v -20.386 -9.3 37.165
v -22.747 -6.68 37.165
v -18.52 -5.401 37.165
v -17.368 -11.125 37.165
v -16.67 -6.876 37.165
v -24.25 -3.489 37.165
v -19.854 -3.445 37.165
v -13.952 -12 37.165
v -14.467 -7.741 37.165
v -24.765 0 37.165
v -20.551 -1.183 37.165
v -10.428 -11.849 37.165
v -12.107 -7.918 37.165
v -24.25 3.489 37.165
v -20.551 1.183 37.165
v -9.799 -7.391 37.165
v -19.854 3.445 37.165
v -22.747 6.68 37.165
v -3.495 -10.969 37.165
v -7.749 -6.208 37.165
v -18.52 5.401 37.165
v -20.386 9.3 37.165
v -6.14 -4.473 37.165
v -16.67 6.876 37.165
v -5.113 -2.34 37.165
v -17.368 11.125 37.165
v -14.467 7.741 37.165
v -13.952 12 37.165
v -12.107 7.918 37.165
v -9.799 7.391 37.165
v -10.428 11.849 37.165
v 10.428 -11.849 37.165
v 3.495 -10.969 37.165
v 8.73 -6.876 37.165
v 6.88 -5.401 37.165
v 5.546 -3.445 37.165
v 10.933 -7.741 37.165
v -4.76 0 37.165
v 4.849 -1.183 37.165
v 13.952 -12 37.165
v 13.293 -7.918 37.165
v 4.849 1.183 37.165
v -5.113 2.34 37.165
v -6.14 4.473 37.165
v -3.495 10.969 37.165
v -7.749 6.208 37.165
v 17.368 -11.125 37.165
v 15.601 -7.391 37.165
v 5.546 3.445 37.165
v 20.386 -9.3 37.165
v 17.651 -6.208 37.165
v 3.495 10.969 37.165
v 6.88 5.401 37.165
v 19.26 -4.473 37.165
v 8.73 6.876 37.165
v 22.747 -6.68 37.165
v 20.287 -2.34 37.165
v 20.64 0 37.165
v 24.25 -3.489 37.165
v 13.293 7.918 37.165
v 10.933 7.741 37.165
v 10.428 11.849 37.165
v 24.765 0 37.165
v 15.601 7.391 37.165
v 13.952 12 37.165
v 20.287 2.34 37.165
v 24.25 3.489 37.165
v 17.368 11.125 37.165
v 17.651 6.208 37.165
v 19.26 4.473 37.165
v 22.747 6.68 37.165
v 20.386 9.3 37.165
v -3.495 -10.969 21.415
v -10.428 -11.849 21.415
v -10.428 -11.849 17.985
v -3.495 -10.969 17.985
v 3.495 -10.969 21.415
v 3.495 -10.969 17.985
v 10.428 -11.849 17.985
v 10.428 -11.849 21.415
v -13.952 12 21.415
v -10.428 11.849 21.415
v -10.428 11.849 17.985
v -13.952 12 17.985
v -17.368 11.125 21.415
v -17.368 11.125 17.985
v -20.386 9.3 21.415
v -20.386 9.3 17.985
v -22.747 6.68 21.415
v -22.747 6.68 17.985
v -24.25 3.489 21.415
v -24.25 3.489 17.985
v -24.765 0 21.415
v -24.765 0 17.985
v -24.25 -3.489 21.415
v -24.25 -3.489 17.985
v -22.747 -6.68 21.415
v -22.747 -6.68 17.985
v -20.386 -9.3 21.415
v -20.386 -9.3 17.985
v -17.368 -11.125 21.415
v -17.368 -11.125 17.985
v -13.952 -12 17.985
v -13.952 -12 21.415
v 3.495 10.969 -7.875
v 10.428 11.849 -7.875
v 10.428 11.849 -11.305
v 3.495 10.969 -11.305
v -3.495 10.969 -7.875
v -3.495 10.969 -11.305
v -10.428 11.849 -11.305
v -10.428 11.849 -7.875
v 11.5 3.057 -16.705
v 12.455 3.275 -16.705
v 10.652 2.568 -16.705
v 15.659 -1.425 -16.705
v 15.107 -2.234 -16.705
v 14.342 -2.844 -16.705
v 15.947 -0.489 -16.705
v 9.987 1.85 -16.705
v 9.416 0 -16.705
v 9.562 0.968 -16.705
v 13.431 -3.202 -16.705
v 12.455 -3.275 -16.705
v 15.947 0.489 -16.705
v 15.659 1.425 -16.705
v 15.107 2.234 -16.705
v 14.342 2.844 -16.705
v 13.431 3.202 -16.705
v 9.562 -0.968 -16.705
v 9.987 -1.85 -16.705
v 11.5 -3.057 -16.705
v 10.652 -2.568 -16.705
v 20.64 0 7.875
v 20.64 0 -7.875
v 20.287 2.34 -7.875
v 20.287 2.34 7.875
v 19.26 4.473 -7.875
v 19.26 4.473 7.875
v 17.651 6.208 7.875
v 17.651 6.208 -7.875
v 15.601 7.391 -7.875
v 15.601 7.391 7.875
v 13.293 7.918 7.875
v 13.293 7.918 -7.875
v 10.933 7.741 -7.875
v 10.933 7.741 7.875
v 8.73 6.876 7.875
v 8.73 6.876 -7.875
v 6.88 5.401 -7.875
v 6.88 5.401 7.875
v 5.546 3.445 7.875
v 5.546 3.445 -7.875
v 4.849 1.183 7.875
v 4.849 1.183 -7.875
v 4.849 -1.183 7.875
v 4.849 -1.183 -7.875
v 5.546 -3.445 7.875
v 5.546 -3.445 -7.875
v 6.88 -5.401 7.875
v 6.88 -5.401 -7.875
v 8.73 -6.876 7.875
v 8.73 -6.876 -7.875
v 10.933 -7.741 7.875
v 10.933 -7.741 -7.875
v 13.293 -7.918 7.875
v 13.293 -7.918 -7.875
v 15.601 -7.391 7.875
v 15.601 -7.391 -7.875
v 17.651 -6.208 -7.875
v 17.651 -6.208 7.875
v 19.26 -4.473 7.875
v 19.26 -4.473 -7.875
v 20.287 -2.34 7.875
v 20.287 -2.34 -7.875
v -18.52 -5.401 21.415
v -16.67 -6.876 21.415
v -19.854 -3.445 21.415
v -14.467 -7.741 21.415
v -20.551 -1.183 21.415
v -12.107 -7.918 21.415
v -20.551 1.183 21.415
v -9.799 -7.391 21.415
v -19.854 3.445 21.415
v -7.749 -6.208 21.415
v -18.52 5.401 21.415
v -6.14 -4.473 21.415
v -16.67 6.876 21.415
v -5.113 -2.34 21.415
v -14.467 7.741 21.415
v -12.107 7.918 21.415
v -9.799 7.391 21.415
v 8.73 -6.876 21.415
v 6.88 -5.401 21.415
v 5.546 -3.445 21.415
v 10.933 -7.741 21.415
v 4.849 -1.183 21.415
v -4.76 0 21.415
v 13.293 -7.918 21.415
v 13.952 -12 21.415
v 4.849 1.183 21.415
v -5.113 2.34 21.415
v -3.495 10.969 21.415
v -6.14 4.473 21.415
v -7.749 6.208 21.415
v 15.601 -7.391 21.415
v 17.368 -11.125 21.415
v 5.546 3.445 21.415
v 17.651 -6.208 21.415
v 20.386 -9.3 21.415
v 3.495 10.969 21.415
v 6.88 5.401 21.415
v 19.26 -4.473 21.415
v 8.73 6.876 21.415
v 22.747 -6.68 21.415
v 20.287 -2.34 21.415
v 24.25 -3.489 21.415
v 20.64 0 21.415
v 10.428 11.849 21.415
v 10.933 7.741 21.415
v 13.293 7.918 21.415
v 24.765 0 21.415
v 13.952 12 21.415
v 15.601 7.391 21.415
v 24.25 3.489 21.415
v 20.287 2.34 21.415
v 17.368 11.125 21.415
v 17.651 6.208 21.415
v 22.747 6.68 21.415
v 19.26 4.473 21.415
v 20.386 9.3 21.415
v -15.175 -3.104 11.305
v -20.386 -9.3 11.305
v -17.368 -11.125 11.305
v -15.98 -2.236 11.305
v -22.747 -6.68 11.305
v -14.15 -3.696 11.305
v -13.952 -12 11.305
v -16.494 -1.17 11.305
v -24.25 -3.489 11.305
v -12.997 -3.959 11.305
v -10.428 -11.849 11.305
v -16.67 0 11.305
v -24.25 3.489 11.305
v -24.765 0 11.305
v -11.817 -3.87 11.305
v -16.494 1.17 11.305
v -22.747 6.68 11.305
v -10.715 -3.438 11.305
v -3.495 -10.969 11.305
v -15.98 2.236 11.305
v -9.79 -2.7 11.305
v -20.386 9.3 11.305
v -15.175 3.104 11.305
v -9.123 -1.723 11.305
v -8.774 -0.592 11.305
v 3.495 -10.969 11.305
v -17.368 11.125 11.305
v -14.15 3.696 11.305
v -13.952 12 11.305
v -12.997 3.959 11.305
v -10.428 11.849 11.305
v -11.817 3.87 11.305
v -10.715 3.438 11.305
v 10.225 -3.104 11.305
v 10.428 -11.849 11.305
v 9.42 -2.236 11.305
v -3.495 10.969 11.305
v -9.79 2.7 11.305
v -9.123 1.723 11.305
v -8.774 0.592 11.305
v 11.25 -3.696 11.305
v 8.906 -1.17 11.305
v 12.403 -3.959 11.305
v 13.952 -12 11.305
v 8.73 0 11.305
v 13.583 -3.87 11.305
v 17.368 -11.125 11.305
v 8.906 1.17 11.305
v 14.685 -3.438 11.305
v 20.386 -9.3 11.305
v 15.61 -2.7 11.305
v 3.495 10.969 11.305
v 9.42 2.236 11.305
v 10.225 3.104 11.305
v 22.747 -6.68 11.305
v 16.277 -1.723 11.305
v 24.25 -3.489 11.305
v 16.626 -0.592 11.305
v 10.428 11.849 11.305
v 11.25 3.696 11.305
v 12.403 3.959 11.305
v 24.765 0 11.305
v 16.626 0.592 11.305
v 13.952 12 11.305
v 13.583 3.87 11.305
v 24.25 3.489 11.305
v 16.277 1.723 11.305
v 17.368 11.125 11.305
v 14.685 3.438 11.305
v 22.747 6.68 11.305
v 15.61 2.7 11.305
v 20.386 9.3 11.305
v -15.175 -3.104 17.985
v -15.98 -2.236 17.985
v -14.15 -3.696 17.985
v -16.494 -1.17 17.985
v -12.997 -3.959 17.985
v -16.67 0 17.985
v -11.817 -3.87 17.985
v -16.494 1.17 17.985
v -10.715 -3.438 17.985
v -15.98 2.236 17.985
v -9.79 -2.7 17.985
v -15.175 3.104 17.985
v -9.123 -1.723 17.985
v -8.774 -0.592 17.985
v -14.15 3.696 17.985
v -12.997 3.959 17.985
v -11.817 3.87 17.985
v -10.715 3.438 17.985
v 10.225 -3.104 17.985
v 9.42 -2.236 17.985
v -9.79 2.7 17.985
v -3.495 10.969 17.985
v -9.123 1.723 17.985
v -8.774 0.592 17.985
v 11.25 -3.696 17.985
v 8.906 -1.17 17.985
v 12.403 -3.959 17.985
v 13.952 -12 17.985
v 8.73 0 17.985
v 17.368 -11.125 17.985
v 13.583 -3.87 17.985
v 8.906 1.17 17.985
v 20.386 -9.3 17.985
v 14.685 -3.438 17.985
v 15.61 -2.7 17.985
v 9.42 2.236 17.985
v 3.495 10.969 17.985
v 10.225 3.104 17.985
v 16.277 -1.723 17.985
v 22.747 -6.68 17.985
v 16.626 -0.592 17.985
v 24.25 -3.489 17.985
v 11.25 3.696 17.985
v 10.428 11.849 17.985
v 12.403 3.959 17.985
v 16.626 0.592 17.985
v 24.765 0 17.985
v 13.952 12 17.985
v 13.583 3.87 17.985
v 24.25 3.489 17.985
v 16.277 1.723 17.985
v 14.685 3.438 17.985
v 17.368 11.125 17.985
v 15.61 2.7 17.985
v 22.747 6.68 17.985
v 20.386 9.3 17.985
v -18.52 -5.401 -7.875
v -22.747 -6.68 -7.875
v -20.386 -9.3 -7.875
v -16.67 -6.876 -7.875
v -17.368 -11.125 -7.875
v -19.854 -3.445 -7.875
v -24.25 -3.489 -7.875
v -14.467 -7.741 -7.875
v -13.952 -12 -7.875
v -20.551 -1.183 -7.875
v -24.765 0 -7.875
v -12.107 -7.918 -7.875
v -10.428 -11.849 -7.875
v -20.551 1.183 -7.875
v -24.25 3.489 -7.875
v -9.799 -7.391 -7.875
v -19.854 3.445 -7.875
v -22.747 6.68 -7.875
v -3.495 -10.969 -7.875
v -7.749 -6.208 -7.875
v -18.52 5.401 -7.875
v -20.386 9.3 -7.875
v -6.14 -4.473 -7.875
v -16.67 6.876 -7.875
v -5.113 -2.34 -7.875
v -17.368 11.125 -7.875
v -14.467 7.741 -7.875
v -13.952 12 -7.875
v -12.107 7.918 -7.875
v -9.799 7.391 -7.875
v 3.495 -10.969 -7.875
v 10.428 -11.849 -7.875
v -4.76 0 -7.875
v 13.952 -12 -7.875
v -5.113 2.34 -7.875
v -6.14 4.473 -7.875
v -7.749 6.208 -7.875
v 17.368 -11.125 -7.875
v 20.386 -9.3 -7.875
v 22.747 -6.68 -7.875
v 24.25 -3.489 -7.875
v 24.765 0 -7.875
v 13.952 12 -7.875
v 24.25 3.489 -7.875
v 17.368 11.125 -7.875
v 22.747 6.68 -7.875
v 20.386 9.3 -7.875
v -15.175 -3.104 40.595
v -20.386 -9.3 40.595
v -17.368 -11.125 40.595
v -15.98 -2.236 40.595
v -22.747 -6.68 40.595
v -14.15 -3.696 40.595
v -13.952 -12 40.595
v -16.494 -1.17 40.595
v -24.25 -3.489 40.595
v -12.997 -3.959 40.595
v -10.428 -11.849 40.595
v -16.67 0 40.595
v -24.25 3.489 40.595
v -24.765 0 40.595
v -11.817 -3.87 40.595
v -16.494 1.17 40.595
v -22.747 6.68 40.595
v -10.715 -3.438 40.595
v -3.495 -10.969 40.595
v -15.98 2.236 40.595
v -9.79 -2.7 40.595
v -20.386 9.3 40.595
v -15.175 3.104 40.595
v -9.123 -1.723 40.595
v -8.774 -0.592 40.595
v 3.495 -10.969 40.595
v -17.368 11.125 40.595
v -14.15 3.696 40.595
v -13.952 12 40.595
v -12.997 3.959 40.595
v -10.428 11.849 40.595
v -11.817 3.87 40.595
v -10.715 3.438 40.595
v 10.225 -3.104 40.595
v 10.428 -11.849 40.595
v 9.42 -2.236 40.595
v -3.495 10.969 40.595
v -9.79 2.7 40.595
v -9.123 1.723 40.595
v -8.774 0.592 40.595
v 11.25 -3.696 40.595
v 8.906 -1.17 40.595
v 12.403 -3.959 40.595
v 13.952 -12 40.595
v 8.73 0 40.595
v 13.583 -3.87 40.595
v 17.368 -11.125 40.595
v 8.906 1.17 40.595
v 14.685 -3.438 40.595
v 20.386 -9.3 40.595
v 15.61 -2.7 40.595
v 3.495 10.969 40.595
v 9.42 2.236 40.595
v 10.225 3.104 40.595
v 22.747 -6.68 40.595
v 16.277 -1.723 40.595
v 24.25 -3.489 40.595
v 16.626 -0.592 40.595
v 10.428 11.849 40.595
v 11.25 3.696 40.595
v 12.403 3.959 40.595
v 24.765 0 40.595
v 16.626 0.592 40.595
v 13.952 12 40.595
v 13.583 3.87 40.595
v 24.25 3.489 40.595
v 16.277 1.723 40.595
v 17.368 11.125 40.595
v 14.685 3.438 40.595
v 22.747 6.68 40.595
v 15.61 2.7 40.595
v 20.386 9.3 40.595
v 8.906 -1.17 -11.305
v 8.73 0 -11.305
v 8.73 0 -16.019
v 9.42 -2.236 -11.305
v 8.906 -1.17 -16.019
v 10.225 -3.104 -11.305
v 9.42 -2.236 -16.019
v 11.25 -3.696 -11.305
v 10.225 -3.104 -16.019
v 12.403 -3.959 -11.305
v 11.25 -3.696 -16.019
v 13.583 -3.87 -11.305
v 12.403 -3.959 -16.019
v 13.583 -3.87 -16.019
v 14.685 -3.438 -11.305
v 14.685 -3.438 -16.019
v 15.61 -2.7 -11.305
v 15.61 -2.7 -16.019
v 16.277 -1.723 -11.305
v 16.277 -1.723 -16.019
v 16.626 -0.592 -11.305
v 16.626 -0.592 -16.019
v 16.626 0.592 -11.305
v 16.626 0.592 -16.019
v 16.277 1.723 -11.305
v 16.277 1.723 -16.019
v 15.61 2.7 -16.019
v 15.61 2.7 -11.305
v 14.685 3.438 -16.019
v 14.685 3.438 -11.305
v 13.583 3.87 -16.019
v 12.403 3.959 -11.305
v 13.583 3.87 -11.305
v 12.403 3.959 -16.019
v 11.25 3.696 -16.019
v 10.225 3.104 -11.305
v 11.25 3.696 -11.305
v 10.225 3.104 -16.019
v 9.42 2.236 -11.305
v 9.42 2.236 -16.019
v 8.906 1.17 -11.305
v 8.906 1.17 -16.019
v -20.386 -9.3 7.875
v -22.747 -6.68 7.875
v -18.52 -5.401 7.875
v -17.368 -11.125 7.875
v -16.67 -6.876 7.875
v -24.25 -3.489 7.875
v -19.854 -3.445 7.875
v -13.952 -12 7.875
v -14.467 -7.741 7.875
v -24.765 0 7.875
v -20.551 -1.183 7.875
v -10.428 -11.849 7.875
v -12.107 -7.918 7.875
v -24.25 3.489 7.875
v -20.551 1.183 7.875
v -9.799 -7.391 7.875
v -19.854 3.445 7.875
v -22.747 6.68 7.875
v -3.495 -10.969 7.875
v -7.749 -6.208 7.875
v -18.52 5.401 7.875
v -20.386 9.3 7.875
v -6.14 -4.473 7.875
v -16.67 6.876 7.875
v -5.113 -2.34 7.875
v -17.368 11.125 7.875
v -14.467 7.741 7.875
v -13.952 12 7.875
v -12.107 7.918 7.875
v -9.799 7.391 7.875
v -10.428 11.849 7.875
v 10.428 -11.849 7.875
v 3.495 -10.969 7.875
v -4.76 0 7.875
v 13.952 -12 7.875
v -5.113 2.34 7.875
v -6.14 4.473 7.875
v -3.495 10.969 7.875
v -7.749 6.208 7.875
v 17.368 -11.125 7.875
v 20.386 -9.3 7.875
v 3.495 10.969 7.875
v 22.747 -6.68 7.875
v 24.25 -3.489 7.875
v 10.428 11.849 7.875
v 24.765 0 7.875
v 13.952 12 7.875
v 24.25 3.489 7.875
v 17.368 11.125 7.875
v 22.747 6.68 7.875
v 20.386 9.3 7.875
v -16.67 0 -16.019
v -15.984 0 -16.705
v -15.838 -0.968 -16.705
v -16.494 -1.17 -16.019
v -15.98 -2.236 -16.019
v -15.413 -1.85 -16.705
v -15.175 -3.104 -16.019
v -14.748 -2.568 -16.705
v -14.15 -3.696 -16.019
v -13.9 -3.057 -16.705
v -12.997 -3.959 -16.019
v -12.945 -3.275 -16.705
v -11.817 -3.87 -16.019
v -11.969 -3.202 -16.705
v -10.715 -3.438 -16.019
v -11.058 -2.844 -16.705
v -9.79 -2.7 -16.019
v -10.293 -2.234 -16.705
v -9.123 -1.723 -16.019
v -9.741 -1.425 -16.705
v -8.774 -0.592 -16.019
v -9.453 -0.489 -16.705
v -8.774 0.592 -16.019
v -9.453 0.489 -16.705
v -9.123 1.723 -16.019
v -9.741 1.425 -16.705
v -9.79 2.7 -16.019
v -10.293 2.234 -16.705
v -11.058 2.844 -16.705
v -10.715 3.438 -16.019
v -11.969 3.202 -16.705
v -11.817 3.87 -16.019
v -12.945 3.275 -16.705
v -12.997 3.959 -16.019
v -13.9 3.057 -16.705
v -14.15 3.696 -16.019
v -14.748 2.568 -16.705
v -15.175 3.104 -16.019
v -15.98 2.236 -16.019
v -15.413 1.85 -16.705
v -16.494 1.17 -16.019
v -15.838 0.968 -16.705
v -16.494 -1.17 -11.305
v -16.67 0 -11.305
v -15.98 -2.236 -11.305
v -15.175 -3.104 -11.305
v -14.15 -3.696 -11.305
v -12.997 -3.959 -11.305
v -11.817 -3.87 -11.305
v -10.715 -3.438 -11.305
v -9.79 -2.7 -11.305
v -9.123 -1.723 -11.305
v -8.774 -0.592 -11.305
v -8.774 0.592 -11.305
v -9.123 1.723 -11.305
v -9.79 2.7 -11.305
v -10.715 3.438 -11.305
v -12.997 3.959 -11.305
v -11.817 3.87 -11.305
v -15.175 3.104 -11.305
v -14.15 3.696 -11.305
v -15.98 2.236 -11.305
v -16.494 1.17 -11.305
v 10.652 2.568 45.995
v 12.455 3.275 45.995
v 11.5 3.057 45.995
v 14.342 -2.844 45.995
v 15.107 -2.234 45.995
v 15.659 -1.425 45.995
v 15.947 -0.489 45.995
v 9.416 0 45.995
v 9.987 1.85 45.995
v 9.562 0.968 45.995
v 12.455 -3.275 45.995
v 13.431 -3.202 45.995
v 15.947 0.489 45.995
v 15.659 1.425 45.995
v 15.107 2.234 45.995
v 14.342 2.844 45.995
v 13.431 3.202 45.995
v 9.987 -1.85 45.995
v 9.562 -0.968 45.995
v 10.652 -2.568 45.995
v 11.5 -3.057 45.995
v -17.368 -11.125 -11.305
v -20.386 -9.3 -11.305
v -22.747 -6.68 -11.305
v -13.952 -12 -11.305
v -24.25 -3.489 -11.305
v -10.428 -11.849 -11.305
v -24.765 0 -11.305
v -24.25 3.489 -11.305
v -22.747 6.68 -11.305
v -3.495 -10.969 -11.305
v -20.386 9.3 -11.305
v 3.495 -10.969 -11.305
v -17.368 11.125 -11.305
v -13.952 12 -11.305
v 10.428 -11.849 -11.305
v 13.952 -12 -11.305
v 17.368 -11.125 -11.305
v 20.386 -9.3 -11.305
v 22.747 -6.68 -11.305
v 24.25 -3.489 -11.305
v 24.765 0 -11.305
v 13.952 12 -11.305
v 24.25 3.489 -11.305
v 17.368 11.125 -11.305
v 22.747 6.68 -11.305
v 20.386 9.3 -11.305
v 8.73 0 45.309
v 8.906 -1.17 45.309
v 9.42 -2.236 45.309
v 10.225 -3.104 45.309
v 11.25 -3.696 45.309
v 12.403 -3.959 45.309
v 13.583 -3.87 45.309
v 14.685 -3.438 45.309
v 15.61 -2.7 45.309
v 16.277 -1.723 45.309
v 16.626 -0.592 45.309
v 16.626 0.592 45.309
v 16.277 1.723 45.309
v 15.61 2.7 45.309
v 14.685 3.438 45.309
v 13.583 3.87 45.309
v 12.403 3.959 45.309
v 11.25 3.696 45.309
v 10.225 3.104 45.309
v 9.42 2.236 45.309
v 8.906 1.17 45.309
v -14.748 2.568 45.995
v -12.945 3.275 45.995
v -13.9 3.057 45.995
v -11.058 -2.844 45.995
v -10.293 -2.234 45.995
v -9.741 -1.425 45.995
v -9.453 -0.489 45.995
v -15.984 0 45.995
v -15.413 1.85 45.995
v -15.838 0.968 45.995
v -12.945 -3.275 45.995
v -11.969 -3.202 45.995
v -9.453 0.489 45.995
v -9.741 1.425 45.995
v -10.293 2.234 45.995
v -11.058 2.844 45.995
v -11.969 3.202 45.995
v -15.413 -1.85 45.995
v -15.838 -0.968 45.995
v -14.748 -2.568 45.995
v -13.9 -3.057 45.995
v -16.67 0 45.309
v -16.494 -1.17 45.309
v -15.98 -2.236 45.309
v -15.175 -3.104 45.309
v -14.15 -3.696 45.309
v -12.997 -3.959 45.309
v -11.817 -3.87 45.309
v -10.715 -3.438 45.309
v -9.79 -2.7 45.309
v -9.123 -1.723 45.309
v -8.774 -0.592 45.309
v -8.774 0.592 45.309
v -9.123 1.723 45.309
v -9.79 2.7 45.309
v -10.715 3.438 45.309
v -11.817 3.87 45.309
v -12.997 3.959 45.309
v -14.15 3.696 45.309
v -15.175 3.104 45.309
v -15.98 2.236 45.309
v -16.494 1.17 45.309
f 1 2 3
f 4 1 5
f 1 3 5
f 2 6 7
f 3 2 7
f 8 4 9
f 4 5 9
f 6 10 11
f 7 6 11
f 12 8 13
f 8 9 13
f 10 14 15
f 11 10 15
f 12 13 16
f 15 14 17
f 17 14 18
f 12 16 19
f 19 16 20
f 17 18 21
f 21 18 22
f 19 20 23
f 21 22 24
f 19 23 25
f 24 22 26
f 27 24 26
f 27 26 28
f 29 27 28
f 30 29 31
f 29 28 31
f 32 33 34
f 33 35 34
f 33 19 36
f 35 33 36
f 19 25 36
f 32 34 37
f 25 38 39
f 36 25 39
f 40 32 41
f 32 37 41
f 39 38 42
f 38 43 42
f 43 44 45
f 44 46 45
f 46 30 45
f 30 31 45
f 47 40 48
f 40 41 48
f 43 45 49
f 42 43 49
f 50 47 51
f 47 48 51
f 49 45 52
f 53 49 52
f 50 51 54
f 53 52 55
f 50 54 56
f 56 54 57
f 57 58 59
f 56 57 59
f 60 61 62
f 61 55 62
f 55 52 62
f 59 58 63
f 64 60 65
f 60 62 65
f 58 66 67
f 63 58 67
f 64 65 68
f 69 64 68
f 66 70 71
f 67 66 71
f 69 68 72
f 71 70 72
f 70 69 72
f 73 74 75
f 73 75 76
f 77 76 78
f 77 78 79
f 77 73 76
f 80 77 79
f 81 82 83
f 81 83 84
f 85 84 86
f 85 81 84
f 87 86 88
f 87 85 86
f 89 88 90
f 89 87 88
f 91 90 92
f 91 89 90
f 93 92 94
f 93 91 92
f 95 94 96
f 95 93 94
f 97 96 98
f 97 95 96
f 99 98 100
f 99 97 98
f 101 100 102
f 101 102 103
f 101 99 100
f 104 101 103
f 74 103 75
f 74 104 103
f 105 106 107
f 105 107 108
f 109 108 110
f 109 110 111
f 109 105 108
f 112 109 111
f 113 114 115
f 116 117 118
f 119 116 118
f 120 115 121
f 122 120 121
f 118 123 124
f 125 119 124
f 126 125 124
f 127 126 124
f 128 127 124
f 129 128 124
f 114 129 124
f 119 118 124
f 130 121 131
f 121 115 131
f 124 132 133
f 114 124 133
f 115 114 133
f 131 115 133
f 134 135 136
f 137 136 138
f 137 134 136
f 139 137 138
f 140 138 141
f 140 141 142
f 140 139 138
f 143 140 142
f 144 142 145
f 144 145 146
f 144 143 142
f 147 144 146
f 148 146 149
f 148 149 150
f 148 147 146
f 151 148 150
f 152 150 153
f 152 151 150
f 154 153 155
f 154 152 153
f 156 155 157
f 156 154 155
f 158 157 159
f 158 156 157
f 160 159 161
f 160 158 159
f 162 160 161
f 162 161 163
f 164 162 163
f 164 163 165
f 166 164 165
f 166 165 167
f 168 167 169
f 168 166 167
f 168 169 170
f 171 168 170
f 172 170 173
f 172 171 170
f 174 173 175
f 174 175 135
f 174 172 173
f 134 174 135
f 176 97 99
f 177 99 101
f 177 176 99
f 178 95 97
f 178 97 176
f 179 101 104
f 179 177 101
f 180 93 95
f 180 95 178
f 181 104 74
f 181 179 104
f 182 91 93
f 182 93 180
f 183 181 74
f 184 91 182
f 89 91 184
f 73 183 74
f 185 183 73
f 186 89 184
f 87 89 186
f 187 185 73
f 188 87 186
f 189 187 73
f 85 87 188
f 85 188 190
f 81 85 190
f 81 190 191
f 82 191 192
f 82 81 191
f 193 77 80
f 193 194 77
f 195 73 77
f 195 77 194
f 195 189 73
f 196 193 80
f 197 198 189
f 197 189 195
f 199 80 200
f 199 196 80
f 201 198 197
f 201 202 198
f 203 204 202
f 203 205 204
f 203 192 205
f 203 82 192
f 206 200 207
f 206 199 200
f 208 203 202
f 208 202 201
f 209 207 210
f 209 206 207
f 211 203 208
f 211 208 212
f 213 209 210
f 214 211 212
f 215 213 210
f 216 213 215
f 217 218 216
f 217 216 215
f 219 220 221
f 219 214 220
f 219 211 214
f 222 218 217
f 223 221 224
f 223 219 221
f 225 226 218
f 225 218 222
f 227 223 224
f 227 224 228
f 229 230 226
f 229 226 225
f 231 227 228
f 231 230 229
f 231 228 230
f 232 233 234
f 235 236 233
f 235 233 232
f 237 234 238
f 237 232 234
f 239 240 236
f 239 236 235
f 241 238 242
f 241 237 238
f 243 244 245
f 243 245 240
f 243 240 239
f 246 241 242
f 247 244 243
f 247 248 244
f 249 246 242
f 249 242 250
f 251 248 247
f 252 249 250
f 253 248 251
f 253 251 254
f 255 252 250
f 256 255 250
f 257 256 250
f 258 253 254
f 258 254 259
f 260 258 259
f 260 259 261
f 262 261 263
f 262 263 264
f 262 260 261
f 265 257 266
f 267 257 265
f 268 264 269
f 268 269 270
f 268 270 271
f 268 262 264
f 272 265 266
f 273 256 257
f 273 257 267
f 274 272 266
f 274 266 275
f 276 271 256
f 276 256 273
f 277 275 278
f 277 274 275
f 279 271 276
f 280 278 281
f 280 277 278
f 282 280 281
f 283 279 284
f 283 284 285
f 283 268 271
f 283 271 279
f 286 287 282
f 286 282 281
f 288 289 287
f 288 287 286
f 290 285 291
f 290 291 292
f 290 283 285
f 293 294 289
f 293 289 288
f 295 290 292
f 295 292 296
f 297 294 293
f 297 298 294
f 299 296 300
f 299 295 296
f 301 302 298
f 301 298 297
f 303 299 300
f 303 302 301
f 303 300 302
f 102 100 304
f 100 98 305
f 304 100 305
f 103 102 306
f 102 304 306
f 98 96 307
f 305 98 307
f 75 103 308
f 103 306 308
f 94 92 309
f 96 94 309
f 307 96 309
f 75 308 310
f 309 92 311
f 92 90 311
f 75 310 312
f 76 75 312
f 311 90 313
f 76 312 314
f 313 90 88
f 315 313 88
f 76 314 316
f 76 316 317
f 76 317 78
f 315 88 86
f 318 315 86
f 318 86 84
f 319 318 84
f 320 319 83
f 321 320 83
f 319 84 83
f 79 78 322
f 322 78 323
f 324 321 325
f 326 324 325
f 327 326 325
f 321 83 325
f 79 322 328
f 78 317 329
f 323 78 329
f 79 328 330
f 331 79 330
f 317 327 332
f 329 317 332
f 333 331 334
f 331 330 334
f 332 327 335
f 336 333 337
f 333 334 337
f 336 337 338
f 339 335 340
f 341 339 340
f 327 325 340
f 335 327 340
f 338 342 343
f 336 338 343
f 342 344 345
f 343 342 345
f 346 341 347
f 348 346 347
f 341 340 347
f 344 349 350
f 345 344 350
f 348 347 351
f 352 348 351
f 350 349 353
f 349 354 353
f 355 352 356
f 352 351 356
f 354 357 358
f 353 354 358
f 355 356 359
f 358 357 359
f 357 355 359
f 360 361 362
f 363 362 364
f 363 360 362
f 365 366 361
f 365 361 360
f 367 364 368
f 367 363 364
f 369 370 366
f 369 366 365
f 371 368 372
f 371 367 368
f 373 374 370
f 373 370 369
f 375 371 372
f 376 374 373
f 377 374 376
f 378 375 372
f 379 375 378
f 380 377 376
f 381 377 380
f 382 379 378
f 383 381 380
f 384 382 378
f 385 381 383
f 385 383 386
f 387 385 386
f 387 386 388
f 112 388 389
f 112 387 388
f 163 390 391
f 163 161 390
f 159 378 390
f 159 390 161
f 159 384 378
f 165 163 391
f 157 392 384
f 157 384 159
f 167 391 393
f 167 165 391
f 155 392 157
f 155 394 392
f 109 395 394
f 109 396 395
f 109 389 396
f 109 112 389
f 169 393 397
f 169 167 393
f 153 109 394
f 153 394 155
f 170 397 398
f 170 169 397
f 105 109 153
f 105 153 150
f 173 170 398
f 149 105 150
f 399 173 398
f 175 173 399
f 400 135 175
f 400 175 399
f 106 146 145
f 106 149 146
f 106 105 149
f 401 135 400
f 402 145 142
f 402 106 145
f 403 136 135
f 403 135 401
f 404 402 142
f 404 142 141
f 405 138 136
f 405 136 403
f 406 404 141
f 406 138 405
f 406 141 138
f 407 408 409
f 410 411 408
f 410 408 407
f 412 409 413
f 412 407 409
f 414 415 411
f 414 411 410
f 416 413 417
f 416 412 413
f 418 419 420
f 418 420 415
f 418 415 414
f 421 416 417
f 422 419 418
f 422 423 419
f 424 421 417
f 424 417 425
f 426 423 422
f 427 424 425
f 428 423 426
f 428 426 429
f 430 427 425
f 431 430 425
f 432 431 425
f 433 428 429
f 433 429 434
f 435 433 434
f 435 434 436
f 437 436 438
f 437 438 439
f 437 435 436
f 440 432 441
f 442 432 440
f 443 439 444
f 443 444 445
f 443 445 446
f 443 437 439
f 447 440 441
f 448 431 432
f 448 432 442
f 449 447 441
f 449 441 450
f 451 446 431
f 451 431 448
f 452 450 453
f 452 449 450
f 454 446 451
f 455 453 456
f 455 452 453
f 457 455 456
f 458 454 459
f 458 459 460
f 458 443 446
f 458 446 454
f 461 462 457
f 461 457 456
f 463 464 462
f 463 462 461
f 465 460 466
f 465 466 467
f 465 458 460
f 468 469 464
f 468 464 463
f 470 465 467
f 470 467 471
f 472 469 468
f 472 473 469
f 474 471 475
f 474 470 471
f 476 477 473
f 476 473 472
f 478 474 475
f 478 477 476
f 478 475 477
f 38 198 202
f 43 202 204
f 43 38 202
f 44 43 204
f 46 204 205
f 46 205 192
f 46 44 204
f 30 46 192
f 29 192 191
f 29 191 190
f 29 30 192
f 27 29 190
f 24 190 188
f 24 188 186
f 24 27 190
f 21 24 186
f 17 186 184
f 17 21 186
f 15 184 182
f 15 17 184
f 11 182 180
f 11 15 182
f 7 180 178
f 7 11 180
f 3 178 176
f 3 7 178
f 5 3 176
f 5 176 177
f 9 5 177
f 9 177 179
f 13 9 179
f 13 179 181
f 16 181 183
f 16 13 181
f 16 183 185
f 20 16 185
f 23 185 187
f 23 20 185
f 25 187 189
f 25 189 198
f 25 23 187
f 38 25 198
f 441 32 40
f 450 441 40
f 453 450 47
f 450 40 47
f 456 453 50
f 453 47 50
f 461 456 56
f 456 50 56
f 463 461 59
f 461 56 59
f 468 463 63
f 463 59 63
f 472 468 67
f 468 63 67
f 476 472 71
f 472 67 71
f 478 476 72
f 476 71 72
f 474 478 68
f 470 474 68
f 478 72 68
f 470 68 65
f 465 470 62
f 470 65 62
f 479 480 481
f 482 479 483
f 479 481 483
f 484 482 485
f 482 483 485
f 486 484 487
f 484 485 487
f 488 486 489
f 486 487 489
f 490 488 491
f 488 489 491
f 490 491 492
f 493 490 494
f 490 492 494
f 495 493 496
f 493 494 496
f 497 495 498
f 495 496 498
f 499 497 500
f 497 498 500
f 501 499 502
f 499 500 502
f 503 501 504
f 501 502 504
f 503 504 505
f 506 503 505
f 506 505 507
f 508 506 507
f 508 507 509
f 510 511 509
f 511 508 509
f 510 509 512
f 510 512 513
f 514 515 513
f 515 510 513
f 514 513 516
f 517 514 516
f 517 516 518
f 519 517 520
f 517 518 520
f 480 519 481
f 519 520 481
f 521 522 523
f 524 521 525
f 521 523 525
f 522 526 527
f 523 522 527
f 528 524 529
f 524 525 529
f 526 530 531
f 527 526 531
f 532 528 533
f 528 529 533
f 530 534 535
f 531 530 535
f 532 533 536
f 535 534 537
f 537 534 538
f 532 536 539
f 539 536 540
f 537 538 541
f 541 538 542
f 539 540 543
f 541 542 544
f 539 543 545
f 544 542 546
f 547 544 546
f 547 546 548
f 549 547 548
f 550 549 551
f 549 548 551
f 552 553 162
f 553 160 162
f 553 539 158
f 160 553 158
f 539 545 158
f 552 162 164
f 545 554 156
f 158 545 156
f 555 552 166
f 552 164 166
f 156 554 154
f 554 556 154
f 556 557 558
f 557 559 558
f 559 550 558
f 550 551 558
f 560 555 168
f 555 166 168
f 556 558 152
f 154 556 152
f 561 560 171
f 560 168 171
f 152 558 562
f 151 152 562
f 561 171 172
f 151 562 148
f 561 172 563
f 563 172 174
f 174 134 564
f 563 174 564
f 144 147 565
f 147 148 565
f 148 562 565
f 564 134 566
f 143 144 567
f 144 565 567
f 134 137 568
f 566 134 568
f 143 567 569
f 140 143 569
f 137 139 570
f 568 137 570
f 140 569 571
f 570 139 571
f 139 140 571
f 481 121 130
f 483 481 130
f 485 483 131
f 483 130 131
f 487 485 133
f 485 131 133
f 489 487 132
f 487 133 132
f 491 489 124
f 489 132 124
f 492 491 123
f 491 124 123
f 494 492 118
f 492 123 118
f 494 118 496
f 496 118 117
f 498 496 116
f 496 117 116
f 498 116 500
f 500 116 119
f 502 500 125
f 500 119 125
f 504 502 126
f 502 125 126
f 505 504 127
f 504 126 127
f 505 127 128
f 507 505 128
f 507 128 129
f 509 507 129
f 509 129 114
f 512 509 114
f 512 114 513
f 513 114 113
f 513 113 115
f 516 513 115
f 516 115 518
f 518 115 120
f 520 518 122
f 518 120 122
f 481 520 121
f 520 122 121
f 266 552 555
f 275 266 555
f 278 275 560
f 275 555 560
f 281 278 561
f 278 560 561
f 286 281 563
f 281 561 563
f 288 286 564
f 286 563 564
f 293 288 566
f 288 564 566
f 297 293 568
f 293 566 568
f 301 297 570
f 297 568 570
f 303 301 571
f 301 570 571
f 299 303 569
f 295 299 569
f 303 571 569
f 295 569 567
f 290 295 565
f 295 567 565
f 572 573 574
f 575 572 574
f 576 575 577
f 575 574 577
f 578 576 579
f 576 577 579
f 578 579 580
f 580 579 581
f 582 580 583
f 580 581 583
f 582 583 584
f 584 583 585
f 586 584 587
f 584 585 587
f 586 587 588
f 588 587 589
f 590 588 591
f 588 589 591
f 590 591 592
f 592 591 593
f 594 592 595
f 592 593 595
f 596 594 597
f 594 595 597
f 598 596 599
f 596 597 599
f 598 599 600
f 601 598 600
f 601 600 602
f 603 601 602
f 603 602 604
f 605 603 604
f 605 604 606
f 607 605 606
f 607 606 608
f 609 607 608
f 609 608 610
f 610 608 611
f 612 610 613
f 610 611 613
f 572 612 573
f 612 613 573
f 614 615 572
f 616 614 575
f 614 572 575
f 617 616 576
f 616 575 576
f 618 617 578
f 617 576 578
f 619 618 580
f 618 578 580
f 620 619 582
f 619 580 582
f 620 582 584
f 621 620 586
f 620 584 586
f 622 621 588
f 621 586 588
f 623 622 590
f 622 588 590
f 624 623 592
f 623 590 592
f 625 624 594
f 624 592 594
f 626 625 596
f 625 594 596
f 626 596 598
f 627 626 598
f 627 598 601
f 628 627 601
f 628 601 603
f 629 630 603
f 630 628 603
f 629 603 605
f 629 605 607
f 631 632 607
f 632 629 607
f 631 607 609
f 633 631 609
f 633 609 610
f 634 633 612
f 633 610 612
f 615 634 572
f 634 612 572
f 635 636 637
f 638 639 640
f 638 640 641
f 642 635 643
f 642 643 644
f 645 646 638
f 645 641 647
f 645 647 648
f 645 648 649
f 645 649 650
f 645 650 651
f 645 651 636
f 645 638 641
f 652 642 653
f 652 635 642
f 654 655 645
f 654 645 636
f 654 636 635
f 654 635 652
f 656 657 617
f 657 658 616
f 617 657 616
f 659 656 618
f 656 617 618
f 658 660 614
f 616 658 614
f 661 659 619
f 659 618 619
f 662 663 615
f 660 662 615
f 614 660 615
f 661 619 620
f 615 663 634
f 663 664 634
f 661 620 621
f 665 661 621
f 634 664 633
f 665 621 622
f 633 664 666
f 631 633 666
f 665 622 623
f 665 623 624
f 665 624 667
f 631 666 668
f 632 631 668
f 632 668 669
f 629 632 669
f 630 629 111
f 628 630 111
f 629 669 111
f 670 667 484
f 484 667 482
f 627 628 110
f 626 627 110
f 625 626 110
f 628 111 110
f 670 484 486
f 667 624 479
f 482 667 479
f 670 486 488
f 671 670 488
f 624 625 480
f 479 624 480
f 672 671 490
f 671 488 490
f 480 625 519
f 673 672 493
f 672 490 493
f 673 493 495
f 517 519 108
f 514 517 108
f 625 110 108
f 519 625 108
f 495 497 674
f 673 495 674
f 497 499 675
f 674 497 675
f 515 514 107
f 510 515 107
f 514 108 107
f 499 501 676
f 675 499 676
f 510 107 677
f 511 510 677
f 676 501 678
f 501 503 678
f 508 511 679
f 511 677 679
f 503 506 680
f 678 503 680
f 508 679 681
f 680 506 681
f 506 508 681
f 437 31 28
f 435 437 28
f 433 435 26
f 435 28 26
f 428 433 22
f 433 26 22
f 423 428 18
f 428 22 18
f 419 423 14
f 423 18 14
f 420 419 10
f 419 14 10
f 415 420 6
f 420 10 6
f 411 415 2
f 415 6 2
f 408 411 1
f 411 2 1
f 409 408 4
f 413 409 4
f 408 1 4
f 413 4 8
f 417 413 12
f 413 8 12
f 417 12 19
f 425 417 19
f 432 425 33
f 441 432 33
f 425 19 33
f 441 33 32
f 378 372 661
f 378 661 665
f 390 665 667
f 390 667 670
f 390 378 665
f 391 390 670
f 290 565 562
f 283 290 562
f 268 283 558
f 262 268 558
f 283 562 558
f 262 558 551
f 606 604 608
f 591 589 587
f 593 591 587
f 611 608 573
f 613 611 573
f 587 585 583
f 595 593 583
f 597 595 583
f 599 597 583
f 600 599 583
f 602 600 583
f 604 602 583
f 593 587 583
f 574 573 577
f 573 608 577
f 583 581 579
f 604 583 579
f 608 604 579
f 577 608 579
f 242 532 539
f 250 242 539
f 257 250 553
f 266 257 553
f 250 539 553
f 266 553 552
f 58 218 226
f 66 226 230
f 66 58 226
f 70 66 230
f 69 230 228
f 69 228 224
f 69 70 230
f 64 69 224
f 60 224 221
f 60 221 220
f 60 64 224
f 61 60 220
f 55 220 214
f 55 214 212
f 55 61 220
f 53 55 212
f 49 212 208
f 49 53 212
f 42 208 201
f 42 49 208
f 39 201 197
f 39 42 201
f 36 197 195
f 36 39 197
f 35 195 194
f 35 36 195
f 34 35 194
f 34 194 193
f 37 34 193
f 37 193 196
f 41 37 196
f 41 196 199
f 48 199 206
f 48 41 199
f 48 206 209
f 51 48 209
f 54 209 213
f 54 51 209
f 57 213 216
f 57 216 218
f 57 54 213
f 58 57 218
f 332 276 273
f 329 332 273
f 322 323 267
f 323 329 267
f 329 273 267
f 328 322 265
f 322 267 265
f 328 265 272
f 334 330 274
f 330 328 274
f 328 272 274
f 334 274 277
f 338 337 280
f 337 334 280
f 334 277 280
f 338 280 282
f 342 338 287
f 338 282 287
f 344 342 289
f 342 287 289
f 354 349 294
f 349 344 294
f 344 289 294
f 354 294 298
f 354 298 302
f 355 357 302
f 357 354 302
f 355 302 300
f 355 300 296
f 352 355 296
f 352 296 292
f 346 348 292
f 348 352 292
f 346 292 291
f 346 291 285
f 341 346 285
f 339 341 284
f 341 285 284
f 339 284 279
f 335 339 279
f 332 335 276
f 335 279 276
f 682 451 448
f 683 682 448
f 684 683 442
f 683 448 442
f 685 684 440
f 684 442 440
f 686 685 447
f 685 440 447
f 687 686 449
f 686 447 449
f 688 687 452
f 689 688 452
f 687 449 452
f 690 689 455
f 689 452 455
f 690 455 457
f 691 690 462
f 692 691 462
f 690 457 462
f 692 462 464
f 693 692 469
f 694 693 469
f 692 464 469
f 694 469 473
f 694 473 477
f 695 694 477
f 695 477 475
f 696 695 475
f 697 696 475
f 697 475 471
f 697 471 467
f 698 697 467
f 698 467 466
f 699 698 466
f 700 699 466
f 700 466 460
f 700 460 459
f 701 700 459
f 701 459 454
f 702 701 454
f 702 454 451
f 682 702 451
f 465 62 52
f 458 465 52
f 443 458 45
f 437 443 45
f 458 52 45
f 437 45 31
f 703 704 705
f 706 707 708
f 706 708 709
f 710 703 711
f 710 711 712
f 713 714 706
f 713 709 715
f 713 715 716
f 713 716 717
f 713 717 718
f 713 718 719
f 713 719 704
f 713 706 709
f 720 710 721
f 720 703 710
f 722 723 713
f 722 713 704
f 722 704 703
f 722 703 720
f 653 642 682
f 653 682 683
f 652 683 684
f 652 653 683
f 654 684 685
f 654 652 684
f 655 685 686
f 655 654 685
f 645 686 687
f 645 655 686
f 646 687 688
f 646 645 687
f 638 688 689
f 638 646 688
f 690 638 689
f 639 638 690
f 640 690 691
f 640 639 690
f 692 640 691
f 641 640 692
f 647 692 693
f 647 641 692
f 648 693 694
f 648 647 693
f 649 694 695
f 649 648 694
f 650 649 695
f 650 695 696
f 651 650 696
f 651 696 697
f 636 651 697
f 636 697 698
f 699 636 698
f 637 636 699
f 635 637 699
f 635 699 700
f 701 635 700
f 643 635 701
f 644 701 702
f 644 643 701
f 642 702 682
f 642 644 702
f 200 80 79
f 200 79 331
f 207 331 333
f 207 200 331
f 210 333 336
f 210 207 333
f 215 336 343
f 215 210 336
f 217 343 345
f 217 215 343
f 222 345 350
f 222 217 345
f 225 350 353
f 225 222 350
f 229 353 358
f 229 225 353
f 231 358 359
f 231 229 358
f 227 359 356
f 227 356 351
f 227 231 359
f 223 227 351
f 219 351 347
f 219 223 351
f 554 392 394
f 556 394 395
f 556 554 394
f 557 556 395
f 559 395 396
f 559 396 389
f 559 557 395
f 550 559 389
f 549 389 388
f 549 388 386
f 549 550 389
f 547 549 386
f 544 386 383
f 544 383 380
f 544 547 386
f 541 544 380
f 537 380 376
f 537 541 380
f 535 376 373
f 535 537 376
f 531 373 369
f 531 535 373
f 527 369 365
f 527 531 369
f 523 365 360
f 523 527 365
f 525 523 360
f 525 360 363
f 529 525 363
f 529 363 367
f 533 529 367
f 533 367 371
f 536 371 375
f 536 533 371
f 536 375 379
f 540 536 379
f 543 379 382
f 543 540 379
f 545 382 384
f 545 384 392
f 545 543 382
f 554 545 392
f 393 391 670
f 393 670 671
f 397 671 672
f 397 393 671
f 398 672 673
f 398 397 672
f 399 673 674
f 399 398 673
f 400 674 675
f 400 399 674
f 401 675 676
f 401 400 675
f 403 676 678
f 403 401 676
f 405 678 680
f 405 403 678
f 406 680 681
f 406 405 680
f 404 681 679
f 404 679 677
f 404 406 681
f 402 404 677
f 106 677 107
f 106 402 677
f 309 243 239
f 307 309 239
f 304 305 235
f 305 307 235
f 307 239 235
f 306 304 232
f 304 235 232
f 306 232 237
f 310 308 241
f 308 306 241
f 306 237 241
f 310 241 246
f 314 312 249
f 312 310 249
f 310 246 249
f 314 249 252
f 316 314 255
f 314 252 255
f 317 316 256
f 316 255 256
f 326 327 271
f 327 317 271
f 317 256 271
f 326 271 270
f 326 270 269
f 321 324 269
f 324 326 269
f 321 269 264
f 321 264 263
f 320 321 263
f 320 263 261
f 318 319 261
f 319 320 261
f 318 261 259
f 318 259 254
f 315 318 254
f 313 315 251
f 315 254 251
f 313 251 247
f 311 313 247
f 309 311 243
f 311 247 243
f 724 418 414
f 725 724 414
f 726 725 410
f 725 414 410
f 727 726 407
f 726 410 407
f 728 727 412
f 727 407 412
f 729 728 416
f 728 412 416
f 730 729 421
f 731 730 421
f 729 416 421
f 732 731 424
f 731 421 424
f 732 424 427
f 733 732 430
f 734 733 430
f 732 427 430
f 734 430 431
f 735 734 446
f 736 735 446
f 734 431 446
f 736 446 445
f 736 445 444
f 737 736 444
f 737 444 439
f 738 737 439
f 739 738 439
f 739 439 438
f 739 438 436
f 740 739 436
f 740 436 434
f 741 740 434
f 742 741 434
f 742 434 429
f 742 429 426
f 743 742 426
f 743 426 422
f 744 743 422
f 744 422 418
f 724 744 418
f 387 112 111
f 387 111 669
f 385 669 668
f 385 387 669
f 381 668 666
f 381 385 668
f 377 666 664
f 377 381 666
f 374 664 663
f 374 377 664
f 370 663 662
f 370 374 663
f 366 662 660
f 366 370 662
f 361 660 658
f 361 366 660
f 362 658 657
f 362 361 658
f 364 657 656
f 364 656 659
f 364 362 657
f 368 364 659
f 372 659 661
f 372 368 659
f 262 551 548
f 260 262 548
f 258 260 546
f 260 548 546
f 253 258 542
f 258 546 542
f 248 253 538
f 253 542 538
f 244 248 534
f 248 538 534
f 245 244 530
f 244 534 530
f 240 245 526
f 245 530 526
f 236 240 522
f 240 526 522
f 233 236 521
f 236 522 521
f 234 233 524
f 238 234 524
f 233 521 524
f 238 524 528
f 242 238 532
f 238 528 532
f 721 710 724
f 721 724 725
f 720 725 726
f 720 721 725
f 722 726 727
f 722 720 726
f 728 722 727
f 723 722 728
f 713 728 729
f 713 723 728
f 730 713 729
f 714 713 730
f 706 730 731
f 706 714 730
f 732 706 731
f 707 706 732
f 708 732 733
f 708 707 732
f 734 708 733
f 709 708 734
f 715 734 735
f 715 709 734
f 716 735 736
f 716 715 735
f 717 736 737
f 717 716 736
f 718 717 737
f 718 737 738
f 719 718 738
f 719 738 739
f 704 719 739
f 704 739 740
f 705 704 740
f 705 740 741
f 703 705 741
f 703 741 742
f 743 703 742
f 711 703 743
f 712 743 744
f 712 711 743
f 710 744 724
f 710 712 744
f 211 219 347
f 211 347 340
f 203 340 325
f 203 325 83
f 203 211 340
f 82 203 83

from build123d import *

# Parameters (mm, degrees)
SKETCH_2_R             = 7.94
EXTRUDE_1_DEPTH        = 7.875
EXTRUDE_1_2_DEPTH      = 7.875
EXTRUDE_2_DEPTH        = 3.43
PATTERN_LINEAR_1_COUNT = 2
PATTERN_LINEAR_1_PITCH = 29.29
EXTRUDE_3_DEPTH        = 45.995
EXTRUDE_3_DEPTH_BACK   = 16.705
SKETCH_4_R             = 3.97
CHAMFER_1_SIZE         = 0.686


with BuildPart() as part:
    # 草图2 → 拉伸1 (new, symmetric)
    with BuildSketch(Plane.XY):
        with Locations((12.7, 0)):
            Circle(SKETCH_2_R)
    extrude(amount=EXTRUDE_1_DEPTH, both=True)



with BuildPart() as body_2:
    # 草图2 → Extrude 1 2 (new, symmetric)
    with BuildSketch(Plane.XY):
        with Locations((-12.7, 0)):
            Circle(SKETCH_2_R)
    extrude(amount=EXTRUDE_1_2_DEPTH, both=True)


with BuildPart() as part_1:
    add(part.part)

    add(body_2.part)  # 拉伸2 merges body 2
    # 草图3 → 拉伸2 (add)
    with BuildSketch(Plane.XY.offset(7.875)):
        with BuildLine():
            ThreePointArc((-10.428153415, 11.849174574), (-24.765, 0), (-10.428153415, -11.849174574))
            ThreePointArc((-10.428153415, -11.849174574), (0, -10.8585), (10.428153415, -11.849174574))
            ThreePointArc((10.428153415, -11.849174574), (24.765, 0), (10.428153415, 11.849174574))
            ThreePointArc((10.428153415, 11.849174574), (0, 10.8585), (-10.428153415, 11.849174574))
        make_face()
    extrude_2 = extrude(amount=EXTRUDE_2_DEPTH)

    # 镜向1: 拉伸2 across plane
    add(extrude_2.mirror(Plane.XY))


with BuildPart() as pattern_linear_1_1:
    # 阵列(线性)1: pattern copy
    add(part_1.part.moved(Location(Vector(0, 0, 1) * (1 * PATTERN_LINEAR_1_PITCH))))


with BuildPart() as part_2:
    add(part_1.part)

    add(pattern_linear_1_1.part)  # 拉伸3 merges 阵列(线性)1_1
    # 草图4 → 拉伸3 (add, two sides: drawn at the far end of the back side and taken through both)
    with BuildSketch(Plane.XY.offset(-EXTRUDE_3_DEPTH_BACK)):
        with Locations(Location((12.7, 0, 0), (0, 0, 180))):
            Circle(SKETCH_4_R)
        with Locations(Location((-12.7, 0, 0), (0, 0, 180))):
            Circle(SKETCH_4_R)
    extrude(amount=EXTRUDE_3_DEPTH + EXTRUDE_3_DEPTH_BACK)

    # 倒角1
    chamfer_1_edges = [part_2.edges().sort_by_distance(p)[0] for p in [
        (16.67, 0, -16.705),
        (16.67, 0, 45.995),
        (-8.73, 0, -16.705),
        (-8.73, 0, 45.995),
    ]]
    chamfer(chamfer_1_edges, length=CHAMFER_1_SIZE)


solid = part_2.part
